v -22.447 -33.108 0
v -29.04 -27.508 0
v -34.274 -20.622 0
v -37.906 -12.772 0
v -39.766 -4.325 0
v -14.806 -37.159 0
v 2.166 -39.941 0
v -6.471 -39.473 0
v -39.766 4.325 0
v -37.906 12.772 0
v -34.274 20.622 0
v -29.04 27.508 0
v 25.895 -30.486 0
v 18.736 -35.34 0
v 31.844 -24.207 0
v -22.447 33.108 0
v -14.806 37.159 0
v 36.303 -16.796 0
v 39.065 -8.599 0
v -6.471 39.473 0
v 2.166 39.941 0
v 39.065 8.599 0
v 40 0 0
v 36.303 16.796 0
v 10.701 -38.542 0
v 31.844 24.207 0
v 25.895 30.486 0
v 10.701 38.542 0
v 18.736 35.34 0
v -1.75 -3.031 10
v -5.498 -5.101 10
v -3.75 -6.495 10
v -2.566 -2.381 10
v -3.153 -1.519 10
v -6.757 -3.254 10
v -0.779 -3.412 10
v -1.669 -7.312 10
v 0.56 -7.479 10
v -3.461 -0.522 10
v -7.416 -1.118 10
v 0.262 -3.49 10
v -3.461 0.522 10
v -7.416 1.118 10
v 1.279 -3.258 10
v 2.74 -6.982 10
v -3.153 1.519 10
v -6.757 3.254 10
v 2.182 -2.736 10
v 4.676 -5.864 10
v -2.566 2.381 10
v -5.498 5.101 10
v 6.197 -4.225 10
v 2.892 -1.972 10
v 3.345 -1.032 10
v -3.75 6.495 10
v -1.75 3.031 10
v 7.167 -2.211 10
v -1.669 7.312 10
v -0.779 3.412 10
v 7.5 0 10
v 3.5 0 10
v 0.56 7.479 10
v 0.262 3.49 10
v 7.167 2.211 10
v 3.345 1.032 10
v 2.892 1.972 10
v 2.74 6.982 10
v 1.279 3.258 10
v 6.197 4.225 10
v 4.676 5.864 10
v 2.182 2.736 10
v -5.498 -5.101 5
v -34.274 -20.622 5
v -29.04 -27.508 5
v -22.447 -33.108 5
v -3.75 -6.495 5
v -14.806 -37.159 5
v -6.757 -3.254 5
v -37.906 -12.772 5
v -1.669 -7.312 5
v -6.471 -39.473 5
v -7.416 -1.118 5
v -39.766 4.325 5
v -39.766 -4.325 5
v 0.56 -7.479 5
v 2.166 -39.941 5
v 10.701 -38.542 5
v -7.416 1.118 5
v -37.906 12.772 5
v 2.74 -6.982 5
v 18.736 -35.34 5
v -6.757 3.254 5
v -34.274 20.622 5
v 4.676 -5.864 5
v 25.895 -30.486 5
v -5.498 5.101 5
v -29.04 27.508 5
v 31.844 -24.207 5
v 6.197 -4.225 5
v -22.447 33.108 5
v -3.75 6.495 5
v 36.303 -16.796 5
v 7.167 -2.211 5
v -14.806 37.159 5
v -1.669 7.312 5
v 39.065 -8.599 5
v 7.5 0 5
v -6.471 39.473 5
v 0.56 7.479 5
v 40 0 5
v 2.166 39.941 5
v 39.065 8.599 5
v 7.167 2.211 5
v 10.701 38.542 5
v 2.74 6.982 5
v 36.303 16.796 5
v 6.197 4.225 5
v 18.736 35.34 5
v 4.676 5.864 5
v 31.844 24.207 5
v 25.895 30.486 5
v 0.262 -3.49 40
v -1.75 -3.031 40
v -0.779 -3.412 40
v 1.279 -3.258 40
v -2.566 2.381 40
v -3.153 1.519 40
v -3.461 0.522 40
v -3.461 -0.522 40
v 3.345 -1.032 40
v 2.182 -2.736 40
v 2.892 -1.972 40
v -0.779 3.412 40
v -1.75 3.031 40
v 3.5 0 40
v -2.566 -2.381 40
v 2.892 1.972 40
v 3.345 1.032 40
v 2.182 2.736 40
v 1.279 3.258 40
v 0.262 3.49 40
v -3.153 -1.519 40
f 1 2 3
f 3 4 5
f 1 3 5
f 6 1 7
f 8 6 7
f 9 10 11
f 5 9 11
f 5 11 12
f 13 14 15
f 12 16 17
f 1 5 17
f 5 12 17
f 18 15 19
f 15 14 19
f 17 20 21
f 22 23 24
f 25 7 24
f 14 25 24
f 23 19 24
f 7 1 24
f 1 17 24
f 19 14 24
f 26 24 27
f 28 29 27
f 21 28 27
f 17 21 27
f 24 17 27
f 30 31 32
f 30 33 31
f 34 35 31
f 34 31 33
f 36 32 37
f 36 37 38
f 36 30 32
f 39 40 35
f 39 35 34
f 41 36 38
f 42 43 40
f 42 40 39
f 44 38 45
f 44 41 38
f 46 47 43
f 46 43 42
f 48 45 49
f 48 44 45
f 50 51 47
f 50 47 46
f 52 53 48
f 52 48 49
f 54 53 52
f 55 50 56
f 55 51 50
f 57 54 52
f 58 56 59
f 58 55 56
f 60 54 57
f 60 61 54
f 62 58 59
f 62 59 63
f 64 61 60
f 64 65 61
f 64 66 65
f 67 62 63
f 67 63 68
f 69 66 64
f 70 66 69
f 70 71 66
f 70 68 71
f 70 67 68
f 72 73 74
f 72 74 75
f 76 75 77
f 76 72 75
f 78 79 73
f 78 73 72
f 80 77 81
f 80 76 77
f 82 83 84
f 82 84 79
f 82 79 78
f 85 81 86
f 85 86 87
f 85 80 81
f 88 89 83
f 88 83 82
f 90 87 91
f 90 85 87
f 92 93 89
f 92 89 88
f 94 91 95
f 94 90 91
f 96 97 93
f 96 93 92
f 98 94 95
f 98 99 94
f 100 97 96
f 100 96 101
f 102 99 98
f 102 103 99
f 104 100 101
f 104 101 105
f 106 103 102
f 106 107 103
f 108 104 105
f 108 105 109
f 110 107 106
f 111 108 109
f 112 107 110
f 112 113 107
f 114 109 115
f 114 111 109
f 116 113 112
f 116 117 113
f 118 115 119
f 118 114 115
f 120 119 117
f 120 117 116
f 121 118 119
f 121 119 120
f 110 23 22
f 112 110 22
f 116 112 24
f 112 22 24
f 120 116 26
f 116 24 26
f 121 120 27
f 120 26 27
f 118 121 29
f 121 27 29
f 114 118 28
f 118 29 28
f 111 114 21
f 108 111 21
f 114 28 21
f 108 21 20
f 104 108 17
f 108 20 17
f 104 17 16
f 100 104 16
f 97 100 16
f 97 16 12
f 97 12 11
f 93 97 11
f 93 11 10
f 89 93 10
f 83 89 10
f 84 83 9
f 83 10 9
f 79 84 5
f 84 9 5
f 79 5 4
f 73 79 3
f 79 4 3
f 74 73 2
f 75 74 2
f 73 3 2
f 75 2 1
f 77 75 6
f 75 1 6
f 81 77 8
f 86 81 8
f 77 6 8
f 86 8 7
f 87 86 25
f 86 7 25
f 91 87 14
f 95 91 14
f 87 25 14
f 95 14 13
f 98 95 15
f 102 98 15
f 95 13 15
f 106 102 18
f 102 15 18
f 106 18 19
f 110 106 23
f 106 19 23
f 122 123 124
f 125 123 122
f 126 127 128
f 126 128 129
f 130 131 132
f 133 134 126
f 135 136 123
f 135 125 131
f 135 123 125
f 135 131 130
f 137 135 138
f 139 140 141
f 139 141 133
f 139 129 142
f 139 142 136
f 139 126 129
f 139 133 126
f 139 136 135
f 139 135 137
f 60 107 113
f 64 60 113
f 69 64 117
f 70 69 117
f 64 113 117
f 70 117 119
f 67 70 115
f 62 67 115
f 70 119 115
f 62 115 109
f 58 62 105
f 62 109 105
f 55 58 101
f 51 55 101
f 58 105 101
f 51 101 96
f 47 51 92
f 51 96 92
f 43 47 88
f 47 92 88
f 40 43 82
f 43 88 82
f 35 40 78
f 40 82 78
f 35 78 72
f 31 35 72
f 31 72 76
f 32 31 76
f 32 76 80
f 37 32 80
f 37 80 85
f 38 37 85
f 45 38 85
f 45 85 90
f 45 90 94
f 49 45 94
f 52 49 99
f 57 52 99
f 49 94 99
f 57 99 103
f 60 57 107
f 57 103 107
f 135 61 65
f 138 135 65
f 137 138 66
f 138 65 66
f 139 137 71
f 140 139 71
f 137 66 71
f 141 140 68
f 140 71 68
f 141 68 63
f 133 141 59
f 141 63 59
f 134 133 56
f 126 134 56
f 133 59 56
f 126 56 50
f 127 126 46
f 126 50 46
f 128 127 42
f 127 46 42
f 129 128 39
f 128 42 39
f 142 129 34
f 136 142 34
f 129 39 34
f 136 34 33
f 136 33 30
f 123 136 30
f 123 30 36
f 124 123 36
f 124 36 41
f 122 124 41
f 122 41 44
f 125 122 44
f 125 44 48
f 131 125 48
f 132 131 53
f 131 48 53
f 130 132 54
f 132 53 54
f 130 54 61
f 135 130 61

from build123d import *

# Parameters (mm, degrees)
CYLINDER002_R     = 3.5
CYLINDER002_DEPTH = 30
CYLINDER001_R     = 7.5
CYLINDER001_DEPTH = 5
CYLINDER_R        = 40
CYLINDER_DEPTH    = 5


with BuildPart() as cilindro:
    # Cylinder002 → Cylinder002 (new body)
    with BuildSketch(Plane.XY.offset(10)):
        Circle(CYLINDER002_R)
    extrude(amount=CYLINDER002_DEPTH)


with BuildPart() as soporte_inicial:
    # Cylinder001 → Cylinder001 (new body)
    with BuildSketch(Plane.XY.offset(5)):
        Circle(CYLINDER001_R)
    extrude(amount=CYLINDER001_DEPTH)


with BuildPart() as fusion001:
    # Cylinder → Cylinder (new body)
    with BuildSketch(Plane.XY):
        Circle(CYLINDER_R)
    extrude(amount=CYLINDER_DEPTH)

    # Fusion: union Soporte inicial
    add(soporte_inicial.part)

    # Fusion001: union Cilindro
    add(cilindro.part)


solid = fusion001.part
